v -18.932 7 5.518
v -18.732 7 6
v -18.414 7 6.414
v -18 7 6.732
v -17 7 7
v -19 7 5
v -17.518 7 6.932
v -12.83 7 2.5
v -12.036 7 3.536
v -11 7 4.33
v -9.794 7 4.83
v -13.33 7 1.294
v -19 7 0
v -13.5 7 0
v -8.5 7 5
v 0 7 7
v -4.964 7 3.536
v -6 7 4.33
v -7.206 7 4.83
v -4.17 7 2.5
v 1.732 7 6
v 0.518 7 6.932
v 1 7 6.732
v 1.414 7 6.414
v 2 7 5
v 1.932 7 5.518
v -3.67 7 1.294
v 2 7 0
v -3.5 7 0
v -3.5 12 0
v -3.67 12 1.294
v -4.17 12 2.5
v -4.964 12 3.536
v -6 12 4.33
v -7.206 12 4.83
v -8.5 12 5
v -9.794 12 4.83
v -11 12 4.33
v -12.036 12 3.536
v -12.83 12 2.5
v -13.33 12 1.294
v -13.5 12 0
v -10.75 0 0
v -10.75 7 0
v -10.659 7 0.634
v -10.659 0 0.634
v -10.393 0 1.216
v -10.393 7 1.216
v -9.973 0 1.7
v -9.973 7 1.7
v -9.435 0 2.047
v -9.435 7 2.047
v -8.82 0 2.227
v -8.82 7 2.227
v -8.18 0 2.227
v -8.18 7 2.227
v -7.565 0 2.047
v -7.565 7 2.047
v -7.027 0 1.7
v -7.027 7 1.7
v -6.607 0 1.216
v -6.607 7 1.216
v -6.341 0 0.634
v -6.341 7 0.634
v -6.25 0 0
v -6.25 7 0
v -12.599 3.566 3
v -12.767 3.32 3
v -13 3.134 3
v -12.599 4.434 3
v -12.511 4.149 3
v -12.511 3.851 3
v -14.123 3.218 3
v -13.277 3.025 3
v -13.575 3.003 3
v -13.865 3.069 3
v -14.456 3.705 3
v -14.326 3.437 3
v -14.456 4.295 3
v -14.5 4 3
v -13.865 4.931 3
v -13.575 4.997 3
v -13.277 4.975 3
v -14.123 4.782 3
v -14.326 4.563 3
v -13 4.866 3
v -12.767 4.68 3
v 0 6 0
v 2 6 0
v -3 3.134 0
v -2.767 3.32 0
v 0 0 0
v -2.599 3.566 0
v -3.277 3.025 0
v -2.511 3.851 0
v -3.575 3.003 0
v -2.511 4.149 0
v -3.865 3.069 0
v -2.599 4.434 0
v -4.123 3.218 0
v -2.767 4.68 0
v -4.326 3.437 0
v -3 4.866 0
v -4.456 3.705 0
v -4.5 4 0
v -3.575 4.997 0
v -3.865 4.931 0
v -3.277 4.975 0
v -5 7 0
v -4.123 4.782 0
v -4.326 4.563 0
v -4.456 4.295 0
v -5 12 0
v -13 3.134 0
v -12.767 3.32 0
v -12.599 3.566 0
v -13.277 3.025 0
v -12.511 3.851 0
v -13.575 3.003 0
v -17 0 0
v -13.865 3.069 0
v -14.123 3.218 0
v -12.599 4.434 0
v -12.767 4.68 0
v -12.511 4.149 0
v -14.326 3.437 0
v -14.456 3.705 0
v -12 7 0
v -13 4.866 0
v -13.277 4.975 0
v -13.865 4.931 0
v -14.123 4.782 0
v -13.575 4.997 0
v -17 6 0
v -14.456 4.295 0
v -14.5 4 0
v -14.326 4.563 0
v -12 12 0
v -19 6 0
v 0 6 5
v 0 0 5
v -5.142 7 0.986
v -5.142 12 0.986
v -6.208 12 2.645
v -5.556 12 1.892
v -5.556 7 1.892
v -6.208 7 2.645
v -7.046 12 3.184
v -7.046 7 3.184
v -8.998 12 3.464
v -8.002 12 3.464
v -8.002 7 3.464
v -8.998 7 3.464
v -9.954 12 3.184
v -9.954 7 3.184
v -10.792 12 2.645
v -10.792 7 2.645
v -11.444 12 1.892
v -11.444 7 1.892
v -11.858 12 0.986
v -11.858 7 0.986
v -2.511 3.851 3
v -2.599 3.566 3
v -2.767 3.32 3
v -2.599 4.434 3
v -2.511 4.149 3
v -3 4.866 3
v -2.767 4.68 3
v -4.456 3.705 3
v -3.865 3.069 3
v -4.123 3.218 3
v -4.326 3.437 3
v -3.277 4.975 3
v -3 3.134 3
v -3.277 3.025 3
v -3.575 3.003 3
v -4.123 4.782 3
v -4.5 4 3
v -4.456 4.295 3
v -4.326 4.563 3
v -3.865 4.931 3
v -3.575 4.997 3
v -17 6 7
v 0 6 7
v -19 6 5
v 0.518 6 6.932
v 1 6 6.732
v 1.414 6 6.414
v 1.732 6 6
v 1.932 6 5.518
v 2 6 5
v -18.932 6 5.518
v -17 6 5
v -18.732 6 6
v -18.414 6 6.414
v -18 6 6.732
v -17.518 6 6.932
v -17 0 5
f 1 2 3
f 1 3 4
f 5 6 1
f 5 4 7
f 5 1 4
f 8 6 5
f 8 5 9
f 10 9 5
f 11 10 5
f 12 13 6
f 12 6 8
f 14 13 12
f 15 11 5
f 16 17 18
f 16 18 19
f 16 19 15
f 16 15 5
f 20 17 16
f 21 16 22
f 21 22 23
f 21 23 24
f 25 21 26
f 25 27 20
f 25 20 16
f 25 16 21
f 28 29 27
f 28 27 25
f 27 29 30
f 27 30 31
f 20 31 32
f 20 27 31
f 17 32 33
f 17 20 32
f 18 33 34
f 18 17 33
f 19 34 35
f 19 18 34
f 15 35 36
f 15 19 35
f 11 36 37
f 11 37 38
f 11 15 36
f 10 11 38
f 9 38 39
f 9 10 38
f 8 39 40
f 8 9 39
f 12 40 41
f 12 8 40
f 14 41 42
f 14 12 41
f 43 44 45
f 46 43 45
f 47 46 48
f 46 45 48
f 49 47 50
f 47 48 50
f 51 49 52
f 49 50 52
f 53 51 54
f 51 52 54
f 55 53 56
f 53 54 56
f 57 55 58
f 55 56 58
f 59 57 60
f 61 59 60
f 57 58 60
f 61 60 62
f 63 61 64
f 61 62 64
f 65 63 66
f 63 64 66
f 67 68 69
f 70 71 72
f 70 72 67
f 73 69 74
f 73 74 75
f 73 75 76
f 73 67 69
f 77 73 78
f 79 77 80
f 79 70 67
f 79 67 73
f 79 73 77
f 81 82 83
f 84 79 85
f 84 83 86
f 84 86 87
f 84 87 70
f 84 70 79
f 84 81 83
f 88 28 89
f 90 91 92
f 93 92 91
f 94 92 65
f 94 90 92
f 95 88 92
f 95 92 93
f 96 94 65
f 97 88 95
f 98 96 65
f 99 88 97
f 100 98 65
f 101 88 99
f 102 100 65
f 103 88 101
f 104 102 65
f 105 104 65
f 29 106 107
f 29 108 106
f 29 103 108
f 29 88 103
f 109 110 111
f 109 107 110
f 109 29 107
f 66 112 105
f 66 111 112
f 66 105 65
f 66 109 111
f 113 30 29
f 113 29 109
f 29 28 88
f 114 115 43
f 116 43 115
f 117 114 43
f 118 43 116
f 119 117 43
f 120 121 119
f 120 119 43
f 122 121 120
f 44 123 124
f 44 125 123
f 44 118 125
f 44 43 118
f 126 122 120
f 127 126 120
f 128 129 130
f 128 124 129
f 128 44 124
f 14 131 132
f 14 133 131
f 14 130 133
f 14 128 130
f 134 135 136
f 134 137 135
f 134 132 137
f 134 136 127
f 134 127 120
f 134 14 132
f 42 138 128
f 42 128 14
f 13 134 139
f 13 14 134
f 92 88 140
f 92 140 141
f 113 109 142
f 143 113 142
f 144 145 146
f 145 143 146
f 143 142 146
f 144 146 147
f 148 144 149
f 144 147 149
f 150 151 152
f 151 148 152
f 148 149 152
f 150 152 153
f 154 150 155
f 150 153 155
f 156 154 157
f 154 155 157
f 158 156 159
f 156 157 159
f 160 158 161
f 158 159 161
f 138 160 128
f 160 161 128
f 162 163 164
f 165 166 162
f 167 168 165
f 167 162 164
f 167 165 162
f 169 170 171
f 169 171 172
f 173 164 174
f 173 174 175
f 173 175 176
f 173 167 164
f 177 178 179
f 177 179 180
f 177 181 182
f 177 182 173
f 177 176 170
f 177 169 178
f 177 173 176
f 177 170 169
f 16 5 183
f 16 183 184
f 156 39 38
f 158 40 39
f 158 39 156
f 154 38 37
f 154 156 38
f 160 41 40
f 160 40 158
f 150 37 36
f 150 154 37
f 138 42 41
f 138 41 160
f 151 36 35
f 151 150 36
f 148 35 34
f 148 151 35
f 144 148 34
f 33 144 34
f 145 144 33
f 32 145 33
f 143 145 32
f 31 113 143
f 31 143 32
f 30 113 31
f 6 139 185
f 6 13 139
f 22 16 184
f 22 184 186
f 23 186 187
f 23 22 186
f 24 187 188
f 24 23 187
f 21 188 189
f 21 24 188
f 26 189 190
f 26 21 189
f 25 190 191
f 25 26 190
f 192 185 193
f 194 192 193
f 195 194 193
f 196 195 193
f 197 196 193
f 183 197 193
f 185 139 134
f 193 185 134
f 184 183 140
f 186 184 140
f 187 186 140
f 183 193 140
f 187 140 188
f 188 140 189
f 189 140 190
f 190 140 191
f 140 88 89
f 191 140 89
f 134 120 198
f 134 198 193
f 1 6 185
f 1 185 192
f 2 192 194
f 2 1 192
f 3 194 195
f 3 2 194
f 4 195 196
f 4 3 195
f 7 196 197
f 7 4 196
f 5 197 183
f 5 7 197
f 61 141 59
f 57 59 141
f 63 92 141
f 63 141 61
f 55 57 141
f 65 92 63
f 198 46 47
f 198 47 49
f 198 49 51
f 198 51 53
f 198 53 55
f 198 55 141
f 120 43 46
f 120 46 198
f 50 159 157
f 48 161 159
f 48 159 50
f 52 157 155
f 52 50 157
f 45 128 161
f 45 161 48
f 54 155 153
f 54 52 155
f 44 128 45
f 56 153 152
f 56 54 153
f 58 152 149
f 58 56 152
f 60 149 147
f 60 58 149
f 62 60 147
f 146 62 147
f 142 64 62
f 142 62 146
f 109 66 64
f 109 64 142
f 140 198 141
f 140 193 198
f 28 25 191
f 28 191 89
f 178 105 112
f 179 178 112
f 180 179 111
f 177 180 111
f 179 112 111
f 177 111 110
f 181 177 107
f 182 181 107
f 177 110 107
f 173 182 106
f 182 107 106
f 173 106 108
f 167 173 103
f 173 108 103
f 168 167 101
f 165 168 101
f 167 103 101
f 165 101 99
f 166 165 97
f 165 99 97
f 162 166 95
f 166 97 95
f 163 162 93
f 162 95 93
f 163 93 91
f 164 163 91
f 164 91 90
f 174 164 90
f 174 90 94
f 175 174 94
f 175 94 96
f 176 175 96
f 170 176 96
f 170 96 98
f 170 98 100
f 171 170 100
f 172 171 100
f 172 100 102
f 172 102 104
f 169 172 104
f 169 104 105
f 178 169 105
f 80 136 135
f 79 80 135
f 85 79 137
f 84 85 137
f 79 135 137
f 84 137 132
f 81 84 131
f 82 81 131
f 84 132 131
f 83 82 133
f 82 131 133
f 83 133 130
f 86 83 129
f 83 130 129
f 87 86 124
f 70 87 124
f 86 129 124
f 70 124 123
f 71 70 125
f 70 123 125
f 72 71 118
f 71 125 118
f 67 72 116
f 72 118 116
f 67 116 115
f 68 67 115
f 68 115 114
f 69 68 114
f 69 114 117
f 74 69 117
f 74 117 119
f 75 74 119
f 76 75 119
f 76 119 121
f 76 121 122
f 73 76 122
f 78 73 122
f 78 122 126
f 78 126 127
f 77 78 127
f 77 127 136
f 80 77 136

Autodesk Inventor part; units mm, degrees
ref_plane "YZ Plane" through (0, 0, 0) normal (1, 0, 0) x (0, 1, 0)
ref_plane "XZ Plane" through (0, 0, 0) normal (0, 1, 0) x (-1, 0, 0)
ref_plane "XY Plane" through (0, 0, 0) normal (0, 0, 1) x (1, 0, 0)
sketch "Эскиз1" plane through (0, 0, 0) normal (0, 0, 1) x (1, 0, 0)
  line L0 (0, 0) -> (-17, 0)
  line L1 (-17, 0) -> (-17, 7)
  line L2 (-17, 7) -> (0, 7)
  line L3 (0, 7) -> (0, 0)
  dimension "d0" = 17
  dimension "d1" = 7
extrude "Выдавливание1" add sketch "Эскиз1" along normal blind 5
sketch "Эскиз2" plane through (-17, 7, 0) normal (0, 1, 0) x (1, 0, 0)
  line L0 (17, 0) -> (0, 0) projected
  line L1 (0, 0) -> (0, -5) projected
  line L2 (17, -5) -> (0, -5) projected
  line L3 (17, 0) -> (17, -5) projected
  line L4 (17, 0) -> (0, 0) projected
  circle A0 centre (8.5, 0) radius 2.25
  point P0 (6.25, 0)
  point P1 (10.75, 0)
  dimension "d4" = 8.5
  dimension "d5" = 4.5
extrude "Выдавливание2" cut sketch "Эскиз2" against normal blind 100 contours A0 L0 picked at (8.074, -0.9762)
sketch "Эскиз3" plane through (-17, 7, 5) normal (0, 1, 0) x (1, 0, 0)
  arc A0 (6.25, 5) -> (10.75, 5) centre (8.5, 5) ccw projected
  arc A1 (5, 5) -> (12, 5) centre (8.5, 5) ccw
  arc A2 (3.5, 5) -> (13.5, 5) centre (8.5, 5) ccw
  line L0 (17, 0) -> (0, 0) projected
  line L1 (6.25, 5) -> (0, 5) projected
  line L2 (17, 5) -> (10.75, 5) projected
  dimension "d8" = 7
extrude "Выдавливание3" add sketch "Эскиз3" along normal blind 5 contours A1 L2 A2 L1
sketch "Эскиз5" plane through (0, 7, 5) normal (0, 1, 0) x (1, 0, 0)
  line L0 (2, 5) -> (-19, 5)
  line L1 (-19, 5) -> (-19, 0)
  line L2 (-17, -2) -> (0, -2)
  line L3 (2, 0) -> (2, 5)
  line L4 (-17, 5) -> (-17, 0) projected
  line L5 (0, 5) -> (0, 0) projected
  line L6 (0, 0) -> (-8.5, 0) projected
  arc A0 (-19, 0) -> (-17, -2) centre (-17, 0) ccw
  arc A1 (0, -2) -> (2, 0) centre (0, 0) ccw
  arc A2 (-13.5, 5) -> (-8.5, 0) centre (-8.5, 5) ccw projected
  line L7 (-13.5, 5) -> (-17, 5) projected
  line L8 (-17, 5) -> (-17, 0) projected
  line L9 (-8.5, 0) -> (-17, 0) projected
  arc A3 (-8.5, 0) -> (-3.5, 5) centre (-8.5, 5) ccw projected
  line L10 (0, 0) -> (-8.5, 0) projected
  line L11 (0, 5) -> (0, 0) projected
  line L12 (0, 5) -> (-3.5, 5) projected
  dimension "d11" = 2
  dimension "d12" = 2
  dimension "d13" = 2
  dimension "d14" = 2
extrude "Выдавливание4" add sketch "Эскиз5" against normal blind 1 contours L3 A1 L2 A0 L1 L0 L4 L9 L6 L5
sketch "Эскиз6" plane through (0, 0, 0) normal (0, 0, -1) x (-1, 0, 0)
  circle A0 centre (3.5, 4) radius 1
  circle A1 centre (13.5, 4) radius 1
  line L0 (8.5, 7.7891) -> (8.5, -0.9569)
  line L1 (6.25, 0) -> (0, 0) projected
  dimension "d17" = 2
  dimension "d18" = 2
  dimension "d19" = 10
  dimension "d20" = 5
  dimension "d21" = 4
extrude "Выдавливание5" cut sketch "Эскиз6" against normal blind 3
properties part number "держатель проводной"
